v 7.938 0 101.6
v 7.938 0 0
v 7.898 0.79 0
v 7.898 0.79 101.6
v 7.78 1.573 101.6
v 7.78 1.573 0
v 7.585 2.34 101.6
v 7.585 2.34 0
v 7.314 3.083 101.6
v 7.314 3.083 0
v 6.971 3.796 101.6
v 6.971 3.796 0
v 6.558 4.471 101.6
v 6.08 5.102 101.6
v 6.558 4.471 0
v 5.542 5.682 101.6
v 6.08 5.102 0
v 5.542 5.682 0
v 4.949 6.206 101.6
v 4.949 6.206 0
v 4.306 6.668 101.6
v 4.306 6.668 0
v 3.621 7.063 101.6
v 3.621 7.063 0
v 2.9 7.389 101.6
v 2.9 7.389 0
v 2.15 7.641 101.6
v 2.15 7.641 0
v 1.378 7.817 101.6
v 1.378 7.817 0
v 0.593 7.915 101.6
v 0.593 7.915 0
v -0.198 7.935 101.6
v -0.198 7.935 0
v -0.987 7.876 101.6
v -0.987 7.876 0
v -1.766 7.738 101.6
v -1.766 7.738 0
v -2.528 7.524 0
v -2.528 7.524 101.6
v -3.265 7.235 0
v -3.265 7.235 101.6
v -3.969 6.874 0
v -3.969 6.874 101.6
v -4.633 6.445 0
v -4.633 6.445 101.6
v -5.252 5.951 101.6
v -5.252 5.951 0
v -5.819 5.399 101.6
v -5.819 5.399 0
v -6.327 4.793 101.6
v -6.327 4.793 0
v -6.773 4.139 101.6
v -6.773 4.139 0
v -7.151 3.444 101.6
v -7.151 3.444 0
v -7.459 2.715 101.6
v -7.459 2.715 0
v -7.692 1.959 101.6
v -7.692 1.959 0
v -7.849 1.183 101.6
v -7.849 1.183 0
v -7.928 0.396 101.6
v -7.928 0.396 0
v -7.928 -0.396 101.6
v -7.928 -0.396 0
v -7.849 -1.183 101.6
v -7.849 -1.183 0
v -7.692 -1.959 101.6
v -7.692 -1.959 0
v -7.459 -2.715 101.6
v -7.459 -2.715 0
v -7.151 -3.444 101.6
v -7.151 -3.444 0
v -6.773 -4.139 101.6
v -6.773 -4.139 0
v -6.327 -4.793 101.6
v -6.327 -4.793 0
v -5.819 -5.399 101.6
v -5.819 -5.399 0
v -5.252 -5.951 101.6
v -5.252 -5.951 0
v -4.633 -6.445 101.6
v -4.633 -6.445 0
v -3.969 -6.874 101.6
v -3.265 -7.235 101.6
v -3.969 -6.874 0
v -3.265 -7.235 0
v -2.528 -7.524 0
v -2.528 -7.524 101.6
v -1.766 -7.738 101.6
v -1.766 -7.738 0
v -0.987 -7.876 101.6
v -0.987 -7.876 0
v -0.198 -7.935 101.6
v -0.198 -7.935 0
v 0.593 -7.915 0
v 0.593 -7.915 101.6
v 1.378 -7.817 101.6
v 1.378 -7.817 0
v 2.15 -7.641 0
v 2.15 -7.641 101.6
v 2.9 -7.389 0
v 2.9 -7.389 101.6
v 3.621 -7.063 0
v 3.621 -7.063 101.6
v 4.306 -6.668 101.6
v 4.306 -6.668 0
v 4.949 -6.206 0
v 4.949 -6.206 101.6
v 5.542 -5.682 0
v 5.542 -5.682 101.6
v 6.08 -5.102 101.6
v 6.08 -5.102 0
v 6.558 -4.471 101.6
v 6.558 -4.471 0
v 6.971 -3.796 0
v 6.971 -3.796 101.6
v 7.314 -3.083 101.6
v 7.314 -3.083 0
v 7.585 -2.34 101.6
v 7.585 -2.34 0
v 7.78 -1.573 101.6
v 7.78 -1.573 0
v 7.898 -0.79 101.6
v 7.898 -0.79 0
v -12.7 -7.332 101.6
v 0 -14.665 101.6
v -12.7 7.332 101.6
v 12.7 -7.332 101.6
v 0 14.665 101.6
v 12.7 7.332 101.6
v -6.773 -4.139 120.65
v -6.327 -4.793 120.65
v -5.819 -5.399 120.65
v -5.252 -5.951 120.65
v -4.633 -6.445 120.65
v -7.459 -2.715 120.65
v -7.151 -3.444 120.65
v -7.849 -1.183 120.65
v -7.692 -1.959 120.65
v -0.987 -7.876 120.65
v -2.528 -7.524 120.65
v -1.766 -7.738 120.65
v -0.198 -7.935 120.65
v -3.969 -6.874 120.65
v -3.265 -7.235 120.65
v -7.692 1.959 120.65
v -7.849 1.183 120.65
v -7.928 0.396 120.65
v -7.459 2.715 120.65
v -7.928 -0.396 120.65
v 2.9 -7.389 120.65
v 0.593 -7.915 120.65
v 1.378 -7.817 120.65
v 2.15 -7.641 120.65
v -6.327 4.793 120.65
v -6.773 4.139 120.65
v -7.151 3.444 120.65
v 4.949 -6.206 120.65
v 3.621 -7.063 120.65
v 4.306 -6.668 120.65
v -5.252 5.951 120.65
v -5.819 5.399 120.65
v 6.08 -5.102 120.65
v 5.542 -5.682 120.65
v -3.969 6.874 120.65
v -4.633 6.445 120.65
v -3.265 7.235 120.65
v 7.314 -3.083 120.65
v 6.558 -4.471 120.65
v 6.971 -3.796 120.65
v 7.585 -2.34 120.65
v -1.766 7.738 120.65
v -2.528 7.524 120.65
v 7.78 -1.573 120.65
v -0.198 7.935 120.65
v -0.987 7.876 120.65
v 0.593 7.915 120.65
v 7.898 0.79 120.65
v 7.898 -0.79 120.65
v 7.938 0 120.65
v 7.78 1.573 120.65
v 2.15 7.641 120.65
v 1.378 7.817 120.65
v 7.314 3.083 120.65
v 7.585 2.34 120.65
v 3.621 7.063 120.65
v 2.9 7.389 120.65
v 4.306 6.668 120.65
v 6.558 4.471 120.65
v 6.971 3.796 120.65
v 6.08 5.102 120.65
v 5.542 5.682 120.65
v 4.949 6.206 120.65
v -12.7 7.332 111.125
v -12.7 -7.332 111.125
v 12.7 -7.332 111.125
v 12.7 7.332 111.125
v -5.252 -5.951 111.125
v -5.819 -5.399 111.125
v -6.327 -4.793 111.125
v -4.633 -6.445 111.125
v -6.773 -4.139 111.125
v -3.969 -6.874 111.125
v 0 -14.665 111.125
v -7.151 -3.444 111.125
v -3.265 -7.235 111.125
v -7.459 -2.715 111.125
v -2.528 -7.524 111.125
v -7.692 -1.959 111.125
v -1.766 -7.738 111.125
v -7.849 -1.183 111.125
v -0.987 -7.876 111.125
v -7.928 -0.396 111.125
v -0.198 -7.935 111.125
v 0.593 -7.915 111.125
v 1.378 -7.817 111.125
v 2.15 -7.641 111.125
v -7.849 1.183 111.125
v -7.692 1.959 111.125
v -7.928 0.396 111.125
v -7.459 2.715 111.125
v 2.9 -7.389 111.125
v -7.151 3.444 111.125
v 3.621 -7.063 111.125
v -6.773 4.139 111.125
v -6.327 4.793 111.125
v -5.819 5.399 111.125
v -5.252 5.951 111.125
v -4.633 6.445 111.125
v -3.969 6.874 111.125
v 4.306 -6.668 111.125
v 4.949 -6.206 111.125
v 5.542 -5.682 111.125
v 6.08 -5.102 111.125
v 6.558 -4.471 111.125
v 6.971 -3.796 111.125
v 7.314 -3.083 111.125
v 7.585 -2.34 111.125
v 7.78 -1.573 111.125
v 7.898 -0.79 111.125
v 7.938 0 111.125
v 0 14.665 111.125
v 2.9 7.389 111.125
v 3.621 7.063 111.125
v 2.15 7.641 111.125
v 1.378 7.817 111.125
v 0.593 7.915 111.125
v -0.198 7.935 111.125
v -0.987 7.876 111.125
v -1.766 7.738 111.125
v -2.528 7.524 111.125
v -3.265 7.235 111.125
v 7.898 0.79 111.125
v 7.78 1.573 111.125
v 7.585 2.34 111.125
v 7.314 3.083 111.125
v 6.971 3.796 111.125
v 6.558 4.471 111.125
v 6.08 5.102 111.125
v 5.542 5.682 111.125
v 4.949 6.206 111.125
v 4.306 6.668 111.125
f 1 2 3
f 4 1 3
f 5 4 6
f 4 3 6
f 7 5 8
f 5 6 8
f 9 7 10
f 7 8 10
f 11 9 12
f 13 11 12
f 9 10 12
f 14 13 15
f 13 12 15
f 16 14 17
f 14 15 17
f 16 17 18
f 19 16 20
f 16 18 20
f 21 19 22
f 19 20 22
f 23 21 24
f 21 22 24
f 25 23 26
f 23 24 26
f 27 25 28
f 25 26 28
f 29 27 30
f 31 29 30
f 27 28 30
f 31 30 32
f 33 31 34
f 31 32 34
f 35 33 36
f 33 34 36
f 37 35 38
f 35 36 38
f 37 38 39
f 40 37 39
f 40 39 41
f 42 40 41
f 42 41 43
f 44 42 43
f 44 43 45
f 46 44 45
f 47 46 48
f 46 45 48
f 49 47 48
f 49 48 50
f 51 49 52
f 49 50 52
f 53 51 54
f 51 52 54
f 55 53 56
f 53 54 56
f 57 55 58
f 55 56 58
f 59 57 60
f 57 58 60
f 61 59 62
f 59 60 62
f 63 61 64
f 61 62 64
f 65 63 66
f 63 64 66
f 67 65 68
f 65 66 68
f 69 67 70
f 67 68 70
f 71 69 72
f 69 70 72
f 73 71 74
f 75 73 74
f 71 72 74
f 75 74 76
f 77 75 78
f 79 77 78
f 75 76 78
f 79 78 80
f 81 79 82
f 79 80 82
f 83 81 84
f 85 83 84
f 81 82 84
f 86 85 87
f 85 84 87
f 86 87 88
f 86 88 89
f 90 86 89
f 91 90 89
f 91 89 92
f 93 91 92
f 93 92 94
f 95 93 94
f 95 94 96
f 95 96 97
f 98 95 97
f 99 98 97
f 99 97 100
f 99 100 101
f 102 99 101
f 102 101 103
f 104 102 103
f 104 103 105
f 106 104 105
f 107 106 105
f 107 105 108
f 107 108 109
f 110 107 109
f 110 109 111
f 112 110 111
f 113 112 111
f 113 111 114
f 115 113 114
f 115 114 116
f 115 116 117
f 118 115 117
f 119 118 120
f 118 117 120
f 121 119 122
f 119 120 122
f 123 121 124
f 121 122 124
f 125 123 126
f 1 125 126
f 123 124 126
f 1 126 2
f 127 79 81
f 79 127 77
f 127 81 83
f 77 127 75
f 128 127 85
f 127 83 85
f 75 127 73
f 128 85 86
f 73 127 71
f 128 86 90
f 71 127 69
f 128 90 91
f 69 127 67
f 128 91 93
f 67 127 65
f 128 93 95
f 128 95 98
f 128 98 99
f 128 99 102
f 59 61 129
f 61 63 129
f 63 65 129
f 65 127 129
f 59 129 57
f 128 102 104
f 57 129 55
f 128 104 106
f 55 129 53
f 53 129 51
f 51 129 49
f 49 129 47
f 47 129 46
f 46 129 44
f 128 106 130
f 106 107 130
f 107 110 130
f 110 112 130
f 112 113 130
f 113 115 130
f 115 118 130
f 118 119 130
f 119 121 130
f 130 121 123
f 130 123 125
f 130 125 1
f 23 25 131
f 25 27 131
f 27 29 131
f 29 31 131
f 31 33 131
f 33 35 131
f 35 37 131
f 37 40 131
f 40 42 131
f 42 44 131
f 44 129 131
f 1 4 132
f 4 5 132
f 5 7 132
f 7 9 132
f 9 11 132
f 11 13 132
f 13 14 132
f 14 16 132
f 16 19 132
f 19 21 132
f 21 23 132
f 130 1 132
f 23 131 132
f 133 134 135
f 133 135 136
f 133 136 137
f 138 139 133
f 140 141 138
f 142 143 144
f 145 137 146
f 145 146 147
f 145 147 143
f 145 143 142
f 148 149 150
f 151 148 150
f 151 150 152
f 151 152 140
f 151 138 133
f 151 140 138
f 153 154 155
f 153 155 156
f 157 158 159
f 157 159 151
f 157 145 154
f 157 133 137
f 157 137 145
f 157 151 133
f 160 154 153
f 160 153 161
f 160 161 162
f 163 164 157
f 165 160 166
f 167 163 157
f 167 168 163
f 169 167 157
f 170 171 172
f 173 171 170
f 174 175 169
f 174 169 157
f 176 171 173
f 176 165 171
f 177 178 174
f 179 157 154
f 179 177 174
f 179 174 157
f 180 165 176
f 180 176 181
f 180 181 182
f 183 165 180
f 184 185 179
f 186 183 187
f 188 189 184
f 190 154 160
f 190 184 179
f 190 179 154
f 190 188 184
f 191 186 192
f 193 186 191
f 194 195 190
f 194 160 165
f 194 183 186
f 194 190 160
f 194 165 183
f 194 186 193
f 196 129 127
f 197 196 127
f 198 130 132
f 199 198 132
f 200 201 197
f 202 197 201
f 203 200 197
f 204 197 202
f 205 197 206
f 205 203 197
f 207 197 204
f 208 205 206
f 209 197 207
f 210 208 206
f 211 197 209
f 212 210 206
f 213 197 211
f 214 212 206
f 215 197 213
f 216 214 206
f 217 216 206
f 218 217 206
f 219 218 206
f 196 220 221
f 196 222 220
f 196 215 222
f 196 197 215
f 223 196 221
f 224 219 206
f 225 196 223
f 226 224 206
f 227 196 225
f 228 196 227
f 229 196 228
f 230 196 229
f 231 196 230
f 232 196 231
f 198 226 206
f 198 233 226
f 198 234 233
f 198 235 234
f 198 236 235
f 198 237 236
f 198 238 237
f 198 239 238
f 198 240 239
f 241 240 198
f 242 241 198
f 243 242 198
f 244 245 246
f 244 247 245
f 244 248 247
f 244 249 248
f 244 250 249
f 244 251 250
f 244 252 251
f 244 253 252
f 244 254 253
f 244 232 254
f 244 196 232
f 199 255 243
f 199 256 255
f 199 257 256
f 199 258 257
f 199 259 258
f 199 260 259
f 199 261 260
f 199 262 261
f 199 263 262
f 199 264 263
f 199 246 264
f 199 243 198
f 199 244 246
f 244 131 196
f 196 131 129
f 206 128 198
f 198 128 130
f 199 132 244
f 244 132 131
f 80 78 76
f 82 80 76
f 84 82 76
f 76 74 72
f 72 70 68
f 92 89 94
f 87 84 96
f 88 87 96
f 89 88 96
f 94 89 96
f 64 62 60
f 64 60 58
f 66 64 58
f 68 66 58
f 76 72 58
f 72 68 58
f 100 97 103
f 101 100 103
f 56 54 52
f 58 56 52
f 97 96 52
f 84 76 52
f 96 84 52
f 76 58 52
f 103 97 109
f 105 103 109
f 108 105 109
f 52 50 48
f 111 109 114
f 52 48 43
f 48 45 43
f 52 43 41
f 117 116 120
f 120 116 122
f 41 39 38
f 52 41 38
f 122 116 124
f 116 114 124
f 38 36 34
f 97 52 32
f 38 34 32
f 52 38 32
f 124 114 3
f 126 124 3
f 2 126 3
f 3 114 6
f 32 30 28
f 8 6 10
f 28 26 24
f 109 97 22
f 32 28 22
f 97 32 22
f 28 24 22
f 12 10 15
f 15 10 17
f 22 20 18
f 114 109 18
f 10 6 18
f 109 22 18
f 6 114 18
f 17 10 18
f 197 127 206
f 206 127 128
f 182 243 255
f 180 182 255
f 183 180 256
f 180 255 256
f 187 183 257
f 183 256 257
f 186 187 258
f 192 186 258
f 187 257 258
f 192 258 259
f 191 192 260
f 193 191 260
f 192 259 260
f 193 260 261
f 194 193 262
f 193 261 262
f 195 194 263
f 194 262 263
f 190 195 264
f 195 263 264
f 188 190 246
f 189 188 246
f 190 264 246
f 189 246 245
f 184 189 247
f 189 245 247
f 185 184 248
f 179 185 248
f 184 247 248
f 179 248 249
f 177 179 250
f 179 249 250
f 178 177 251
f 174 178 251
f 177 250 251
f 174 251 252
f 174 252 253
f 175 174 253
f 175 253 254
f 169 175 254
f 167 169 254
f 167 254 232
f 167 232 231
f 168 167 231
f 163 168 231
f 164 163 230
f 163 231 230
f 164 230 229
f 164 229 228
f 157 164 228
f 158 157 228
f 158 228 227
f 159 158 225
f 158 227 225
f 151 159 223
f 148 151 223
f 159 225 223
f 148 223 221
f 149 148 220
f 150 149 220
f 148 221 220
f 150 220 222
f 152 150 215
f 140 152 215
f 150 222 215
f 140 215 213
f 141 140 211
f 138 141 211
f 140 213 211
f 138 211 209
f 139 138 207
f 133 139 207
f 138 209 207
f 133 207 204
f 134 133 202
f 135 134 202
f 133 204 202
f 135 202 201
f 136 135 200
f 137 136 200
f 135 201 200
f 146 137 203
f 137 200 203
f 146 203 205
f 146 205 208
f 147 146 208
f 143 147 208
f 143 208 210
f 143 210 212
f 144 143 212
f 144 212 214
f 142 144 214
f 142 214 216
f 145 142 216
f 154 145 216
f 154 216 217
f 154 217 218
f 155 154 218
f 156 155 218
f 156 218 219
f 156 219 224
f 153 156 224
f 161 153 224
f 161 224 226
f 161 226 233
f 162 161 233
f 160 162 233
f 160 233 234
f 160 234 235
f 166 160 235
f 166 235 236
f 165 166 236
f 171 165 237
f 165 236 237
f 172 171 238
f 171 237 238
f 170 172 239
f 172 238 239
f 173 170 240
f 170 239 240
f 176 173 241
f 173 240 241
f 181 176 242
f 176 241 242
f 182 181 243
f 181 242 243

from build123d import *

# Parameters (mm, degrees)
SKETCH1_R           = 7.9375
BASE_EXTRUDE_DEPTH  = 101.6
BOSS_EXTRUDE1_DEPTH = 9.525
SKETCH3_R           = 7.9375
BOSS_EXTRUDE2_DEPTH = 9.525


with BuildPart() as part:
    # Sketch1 → Base-Extrude (new body)
    with BuildSketch(Plane.XY):
        Circle(SKETCH1_R)
    extrude(amount=BASE_EXTRUDE_DEPTH)

    # Sketch2 → Boss-Extrude1 (add)
    with BuildSketch(Plane.XY.offset(101.6)):
        Polygon((12.7, -7.332348419), (12.7, 7.332348419), (0, 14.664696837), (-12.7, 7.332348419), (-12.7, -7.332348419), (0, -14.664696837), align=None)
    extrude(amount=BOSS_EXTRUDE1_DEPTH)

    # Sketch3 → Boss-Extrude2 (add)
    with BuildSketch(Plane.XY.offset(111.125)):
        Circle(SKETCH3_R)
    extrude(amount=BOSS_EXTRUDE2_DEPTH)


solid = part.part
